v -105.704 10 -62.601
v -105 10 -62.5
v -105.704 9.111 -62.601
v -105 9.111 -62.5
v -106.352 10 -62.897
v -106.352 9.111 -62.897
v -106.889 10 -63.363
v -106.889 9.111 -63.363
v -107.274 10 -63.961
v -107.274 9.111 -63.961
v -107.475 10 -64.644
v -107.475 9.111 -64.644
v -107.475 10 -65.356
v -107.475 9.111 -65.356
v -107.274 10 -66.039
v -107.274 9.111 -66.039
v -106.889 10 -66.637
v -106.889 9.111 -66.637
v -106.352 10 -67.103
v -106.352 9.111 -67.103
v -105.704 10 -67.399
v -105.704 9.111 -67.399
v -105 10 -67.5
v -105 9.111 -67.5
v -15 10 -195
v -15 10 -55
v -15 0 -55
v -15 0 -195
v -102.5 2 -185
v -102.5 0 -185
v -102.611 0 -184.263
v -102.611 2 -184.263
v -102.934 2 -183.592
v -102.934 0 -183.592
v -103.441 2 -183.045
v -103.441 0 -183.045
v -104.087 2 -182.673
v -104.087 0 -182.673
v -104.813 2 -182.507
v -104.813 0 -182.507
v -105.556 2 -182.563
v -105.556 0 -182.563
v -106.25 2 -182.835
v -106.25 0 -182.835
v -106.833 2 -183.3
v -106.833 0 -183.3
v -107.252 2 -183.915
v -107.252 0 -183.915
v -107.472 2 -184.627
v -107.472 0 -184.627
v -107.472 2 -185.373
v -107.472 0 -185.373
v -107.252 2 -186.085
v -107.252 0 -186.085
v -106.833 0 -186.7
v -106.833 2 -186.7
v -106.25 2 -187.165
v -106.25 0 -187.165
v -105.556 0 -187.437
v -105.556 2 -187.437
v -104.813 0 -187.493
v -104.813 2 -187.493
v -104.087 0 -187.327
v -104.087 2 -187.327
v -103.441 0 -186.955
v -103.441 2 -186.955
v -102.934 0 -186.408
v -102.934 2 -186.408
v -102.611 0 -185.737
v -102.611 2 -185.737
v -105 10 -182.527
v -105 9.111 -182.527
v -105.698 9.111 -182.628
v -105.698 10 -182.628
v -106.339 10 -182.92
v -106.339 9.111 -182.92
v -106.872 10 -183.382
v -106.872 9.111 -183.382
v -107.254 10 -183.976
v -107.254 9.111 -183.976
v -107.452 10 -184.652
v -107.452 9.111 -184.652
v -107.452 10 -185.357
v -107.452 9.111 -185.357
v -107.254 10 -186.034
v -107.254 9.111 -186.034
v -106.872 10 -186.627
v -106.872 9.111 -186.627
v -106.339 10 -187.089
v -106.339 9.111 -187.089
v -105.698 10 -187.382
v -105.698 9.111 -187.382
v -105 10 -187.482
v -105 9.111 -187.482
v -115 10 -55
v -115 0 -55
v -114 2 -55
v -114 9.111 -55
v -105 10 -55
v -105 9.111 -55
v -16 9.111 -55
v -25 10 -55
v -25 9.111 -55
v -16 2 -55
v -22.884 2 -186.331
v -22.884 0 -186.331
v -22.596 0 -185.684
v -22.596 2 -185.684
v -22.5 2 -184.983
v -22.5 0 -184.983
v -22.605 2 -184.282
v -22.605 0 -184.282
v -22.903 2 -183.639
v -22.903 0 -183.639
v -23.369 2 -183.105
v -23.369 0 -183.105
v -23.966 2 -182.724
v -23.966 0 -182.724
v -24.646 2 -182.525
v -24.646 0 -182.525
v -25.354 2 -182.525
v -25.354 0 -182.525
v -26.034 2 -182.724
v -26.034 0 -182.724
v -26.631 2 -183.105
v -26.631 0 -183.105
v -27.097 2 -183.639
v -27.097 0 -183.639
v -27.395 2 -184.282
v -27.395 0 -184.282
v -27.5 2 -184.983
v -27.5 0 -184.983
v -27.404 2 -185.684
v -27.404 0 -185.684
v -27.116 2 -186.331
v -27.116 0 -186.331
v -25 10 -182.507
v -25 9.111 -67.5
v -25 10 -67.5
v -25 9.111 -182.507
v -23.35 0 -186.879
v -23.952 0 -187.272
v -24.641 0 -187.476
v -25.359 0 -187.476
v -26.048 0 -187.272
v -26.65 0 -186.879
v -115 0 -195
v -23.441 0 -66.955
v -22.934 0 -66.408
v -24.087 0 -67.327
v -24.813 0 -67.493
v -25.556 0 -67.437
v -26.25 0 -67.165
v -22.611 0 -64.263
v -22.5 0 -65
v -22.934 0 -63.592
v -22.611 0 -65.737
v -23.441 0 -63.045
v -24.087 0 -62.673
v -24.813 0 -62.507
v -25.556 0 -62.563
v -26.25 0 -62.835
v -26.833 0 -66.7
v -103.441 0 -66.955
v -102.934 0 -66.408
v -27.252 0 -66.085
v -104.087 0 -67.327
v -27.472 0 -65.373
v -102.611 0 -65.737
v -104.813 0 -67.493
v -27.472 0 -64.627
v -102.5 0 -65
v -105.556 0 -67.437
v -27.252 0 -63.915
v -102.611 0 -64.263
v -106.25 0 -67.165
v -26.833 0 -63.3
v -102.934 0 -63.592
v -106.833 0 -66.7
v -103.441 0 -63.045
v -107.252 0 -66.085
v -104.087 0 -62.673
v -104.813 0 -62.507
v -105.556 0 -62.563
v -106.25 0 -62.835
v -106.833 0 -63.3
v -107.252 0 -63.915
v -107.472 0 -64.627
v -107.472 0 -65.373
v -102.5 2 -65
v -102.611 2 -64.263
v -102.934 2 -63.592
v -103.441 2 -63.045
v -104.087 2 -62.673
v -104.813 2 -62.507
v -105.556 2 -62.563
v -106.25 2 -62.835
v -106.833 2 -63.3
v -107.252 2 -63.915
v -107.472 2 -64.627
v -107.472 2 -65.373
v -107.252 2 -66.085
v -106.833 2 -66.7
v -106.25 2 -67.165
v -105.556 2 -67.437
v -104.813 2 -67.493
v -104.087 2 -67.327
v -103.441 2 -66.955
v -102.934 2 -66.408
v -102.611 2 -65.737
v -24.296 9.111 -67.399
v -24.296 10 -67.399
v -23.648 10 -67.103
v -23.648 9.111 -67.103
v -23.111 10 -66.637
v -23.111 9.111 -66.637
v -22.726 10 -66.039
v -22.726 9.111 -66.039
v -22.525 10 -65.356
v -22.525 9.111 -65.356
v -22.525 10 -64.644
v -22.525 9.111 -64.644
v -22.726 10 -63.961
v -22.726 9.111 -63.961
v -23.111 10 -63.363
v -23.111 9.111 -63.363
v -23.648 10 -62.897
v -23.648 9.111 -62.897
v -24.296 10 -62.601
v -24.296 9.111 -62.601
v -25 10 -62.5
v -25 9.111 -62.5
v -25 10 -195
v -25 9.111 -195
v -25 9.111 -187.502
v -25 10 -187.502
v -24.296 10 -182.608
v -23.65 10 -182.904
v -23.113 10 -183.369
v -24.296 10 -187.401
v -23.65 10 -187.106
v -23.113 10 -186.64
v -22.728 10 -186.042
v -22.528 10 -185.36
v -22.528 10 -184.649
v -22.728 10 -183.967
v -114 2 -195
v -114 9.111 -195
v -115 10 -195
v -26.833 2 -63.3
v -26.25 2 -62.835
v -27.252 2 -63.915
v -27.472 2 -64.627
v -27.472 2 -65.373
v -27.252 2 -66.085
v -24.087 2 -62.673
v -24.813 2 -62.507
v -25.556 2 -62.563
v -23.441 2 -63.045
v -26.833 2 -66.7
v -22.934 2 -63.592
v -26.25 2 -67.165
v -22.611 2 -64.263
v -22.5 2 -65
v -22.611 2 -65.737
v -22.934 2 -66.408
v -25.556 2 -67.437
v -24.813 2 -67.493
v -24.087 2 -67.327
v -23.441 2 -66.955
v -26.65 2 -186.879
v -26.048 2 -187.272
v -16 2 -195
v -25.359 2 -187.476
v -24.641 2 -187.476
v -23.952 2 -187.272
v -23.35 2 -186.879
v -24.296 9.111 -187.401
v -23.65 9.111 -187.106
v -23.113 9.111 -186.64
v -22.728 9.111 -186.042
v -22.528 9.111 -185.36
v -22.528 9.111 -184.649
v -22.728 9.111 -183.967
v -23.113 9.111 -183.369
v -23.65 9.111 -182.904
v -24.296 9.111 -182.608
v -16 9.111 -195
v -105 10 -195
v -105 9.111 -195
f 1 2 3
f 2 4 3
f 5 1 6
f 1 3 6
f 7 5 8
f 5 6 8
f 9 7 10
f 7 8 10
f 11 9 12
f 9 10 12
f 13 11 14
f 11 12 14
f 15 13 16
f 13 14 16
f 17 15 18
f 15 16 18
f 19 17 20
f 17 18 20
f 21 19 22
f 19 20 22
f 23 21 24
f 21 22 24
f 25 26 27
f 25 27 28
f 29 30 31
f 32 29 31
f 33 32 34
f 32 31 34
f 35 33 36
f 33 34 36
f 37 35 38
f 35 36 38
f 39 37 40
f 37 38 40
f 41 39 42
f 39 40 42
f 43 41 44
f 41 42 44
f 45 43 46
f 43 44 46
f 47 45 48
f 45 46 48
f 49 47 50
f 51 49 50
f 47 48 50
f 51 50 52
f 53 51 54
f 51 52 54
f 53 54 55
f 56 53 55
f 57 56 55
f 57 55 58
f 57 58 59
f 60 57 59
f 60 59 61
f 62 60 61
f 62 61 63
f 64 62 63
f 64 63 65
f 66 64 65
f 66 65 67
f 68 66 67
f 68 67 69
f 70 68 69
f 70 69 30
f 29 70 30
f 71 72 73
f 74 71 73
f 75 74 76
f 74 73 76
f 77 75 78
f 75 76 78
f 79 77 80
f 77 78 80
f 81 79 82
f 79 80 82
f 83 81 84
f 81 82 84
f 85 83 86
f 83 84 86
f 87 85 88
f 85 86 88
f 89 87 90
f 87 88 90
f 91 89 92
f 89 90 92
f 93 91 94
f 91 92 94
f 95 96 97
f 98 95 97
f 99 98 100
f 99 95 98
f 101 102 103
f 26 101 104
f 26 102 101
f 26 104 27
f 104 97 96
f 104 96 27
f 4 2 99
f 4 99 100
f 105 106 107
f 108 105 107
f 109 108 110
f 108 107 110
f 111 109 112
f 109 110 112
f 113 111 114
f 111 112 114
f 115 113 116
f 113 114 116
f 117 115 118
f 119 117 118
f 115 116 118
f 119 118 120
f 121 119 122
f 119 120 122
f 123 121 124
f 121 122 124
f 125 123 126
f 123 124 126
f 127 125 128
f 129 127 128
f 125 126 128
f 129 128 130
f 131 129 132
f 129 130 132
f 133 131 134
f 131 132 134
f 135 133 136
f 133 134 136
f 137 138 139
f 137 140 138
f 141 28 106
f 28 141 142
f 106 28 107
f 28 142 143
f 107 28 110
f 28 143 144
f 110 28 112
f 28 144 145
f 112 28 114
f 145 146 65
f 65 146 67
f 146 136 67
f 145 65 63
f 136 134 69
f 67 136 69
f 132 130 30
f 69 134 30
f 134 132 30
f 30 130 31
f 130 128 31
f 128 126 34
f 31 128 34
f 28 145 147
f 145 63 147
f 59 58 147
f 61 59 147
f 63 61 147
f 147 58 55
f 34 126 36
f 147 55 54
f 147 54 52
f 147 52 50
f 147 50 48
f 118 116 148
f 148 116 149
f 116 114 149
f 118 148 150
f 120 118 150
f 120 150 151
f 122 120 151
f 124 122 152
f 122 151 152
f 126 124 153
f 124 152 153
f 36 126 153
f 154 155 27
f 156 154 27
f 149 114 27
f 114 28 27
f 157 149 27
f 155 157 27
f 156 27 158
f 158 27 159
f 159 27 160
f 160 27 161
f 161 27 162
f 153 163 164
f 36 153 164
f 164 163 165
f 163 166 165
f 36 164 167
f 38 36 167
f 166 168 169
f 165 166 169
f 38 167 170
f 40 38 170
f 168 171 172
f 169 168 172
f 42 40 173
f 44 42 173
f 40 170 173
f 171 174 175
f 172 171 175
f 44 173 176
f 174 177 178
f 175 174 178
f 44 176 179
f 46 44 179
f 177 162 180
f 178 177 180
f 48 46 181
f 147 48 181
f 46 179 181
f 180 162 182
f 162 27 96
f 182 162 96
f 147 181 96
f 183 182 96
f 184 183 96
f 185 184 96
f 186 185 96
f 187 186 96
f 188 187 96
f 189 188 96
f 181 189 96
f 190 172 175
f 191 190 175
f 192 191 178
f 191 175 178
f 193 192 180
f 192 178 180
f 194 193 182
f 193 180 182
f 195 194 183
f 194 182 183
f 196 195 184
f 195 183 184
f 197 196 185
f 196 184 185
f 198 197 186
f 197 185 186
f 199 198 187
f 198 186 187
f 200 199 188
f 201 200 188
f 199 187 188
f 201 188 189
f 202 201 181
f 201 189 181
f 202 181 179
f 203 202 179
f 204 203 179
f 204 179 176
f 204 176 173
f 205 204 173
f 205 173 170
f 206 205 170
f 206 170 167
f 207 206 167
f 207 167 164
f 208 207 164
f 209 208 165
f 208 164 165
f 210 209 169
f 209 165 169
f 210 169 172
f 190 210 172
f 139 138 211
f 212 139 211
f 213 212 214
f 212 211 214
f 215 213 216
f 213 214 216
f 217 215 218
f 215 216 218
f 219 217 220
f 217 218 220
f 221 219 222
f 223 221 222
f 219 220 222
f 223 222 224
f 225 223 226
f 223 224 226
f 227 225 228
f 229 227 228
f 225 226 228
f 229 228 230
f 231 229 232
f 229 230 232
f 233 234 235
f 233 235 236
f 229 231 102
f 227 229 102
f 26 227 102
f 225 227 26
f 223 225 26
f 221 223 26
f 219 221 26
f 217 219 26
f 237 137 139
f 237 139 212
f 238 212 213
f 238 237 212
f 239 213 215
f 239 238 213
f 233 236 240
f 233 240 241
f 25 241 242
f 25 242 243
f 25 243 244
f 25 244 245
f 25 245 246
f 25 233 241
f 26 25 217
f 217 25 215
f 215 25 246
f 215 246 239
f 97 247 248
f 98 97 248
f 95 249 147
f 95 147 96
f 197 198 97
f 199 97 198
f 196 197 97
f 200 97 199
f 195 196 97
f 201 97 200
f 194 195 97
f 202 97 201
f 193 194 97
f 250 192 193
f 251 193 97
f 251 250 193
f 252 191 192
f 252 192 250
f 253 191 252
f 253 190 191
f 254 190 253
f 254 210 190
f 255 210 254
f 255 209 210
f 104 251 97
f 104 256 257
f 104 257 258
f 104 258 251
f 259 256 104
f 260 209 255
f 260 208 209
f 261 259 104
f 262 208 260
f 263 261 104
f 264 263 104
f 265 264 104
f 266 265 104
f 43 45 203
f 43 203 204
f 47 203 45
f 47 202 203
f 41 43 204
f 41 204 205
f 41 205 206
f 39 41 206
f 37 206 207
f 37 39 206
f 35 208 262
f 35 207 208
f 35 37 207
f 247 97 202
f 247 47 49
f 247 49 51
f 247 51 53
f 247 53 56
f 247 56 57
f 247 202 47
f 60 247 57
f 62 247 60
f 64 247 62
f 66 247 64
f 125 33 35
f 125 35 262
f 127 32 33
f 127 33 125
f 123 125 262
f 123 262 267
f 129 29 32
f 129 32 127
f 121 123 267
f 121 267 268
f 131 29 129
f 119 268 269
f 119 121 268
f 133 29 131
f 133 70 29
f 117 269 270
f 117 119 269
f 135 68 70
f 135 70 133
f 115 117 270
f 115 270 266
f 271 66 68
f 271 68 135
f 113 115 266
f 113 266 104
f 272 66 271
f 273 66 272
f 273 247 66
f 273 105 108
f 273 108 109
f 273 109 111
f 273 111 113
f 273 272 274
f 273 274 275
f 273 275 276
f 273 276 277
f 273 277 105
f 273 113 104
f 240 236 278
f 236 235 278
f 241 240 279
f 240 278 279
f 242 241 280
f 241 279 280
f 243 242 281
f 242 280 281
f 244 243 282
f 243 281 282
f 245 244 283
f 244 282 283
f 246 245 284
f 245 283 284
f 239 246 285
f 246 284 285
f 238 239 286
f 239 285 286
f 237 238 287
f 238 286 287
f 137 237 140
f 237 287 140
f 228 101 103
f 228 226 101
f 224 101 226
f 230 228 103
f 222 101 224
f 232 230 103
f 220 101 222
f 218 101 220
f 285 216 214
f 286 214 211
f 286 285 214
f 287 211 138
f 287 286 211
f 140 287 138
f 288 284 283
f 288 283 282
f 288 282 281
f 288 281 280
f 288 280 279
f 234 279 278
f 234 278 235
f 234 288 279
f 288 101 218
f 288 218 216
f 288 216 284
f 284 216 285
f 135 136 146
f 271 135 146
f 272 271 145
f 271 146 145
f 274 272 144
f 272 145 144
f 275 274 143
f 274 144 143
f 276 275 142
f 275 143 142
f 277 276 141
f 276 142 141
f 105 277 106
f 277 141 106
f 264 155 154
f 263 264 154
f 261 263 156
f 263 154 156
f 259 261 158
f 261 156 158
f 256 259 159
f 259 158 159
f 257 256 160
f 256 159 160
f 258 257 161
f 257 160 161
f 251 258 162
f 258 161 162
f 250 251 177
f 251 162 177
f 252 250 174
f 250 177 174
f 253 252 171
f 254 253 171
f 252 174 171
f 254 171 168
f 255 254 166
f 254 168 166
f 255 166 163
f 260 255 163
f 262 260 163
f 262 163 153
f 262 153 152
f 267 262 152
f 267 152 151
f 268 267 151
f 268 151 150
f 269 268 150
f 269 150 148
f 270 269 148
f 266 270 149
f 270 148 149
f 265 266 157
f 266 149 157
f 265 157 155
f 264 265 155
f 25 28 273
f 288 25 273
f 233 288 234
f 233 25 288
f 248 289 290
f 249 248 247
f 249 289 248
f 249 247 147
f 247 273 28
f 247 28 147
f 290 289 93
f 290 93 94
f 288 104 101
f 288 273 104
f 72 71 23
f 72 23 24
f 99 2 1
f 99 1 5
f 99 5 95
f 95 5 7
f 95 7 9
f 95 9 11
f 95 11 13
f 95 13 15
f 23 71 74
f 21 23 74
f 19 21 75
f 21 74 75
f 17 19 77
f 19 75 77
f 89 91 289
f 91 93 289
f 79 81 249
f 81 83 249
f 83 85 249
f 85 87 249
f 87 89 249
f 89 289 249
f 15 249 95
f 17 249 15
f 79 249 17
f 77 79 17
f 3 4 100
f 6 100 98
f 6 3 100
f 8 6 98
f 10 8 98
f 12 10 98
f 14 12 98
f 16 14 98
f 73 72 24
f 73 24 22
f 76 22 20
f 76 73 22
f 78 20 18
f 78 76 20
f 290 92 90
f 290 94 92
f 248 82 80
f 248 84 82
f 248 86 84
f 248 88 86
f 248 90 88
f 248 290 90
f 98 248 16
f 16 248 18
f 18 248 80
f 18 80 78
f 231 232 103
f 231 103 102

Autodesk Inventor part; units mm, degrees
ref_plane "YZ Plane" through (0, 0, 0) normal (1, 0, 0) x (0, 1, 0)
ref_plane "XZ Plane" through (0, 0, 0) normal (0, 1, 0) x (-1, 0, 0)
ref_plane "XY Plane" through (0, 0, 0) normal (0, 0, 1) x (1, 0, 0)
sketch "Boceto1" plane through (0, 0, 0) normal (0, 1, 0) x (-1, 0, 0)
  line L0 (0, 0) -> (130, 0)
  line L1 (130, 0) -> (130, -230)
  line L2 (130, -230) -> (0, -230)
  line L3 (0, -230) -> (0, 0)
  dimension "d0" = 130
  dimension "d1" = 230
extrude "Extrusión1" add sketch "Boceto1" along normal blind 3
sketch "Boceto2" plane through (0, 3, 0) normal (0, 1, 0) x (1, 0, 0)
  line L0 (0, 230) -> (-130, 230) projected
  line L1 (0, 0) -> (-130, 0)
  line L2 (-130, 0) -> (-130, 230)
  line L3 (-130, 230) -> (0, 230)
  line L4 (0, 230) -> (0, 0)
  line L5 (-127, 227) -> (-127, 3)
  line L6 (-127, 3) -> (-3, 3)
  line L7 (-3, 3) -> (-3, 227)
  line L8 (-3, 227) -> (-127, 227)
  dimension "d4" = 3
extrude "Extrusión2" add sketch "Boceto2" along normal blind 60
sketch "Boceto3" plane through (-127, 3, -3) normal (1, 0, 0) x (0, 0, -1)
  line L0 (224, 0) -> (224, 60) projected
  line L1 (0, 60) -> (224, 60)
  line L2 (224, 60) -> (224, 59)
  line L3 (224, 59) -> (0, 59)
  line L4 (0, 59) -> (0, 60)
  point P0 (-3, -3)
  dimension "d7" = 1
extrude "Extrusión3" add sketch "Boceto3" along normal blind 10
sketch "Boceto4" plane through (-117, 3, -3) normal (1, 0, 0) x (0, 0, -1)
  line L0 (0, 59) -> (224, 59) projected
  line L1 (0, 60) -> (10, 60)
  line L2 (10, 60) -> (10, 59)
  line L3 (10, 59) -> (0, 59)
  line L4 (0, 59) -> (0, 60)
  line L5 (224, 60) -> (214, 60)
  line L6 (214, 60) -> (214, 59)
  line L7 (214, 59) -> (224, 59)
  line L8 (224, 59) -> (224, 60)
  point P0 (-3, -3)
  dimension "d10" = 10
  dimension "d11" = 10
extrude "Extrusión4" add sketch "Boceto4" along normal blind 115.25
sketch "Boceto5" plane through (-117, 63, -217) normal (0, 0, 1) x (1, 0, 0)
  line L0 (114, -1) -> (104, -1)
  line L1 (104, -1) -> (104, 0)
  line L2 (104, 0) -> (114, 0)
  line L3 (114, 0) -> (114, -1)
  line L4 (0, 0) -> (114, 0) projected
  line L5 (0, -1) -> (114, -1) projected
  point P0 (117, -63)
  dimension "d14" = 10
  dimension "d15" = 0
  dimension "d16" = 0
extrude "Extrusión5" add sketch "Boceto5" along normal blind 211.5
sketch "Boceto6" plane through (0, 63, 0) normal (0, 1, 0) x (1, 0, 0)
  circle A0 centre (-10, 220) radius 1.5
  circle A1 centre (-120, 220) radius 1.5
  circle A2 centre (-10, 10) radius 1.5
  circle A3 centre (-120, 10) radius 1.5
  line L0 (-130, 0) -> (0, 0) projected
  line L1 (0, 0) -> (0, 230) projected
  line L2 (-130, 230) -> (-130, 0) projected
  line L3 (0, 230) -> (-130, 230) projected
  dimension "d19" = 3
  dimension "d20" = 3
  dimension "d21" = 3
  dimension "d22" = 3
  dimension "d23" = 10
  dimension "d24" = 10
  dimension "d25" = 10
  dimension "d26" = 10
  dimension "d27" = 10
  dimension "d28" = 10
  dimension "d29" = 10
  dimension "d30" = 10
extrude "Extrusión6" cut sketch "Boceto6" against normal blind 211.5 contours A0 | A1 | A2 | A3
sketch "Boceto7" plane through (0, 0, 0) normal (0, -1, 0) x (1, 0, 0)
  circle A0 centre (-25, -205) radius 4
  circle A1 centre (-105, -205) radius 4
  circle A2 centre (-25, -25) radius 4
  circle A3 centre (-105, -25) radius 4
  line L0 (0, 0) -> (0, -230) projected
  line L1 (0, -230) -> (-130, -230) projected
  line L2 (-130, -230) -> (-130, 0) projected
  line L3 (-130, 0) -> (0, 0) projected
  dimension "d33" = 8
  dimension "d34" = 8
  dimension "d35" = 8
  dimension "d36" = 8
  dimension "d37" = 25
  dimension "d38" = 25
  dimension "d39" = 25
  dimension "d40" = 25
  dimension "d41" = 25
  dimension "d42" = 25
  dimension "d43" = 25
  dimension "d44" = 25
extrude "Extrusión7" cut sketch "Boceto7" against normal blind 10 contours A0 | A1 | A2 | A3
sketch "Boceto8" plane through (0, 0, 0) normal (0, -1, 0) x (1, 0, 0)
  line L0 (-30, -35) -> (-100, -35)
  line L1 (-100, -35) -> (-100, -45)
  line L2 (-100, -45) -> (-30, -45)
  line L3 (-30, -45) -> (-30, -35)
  line L4 (-130, 0) -> (0, 0) projected
  line L5 (0, 0) -> (0, -230) projected
  line L6 (-130, -230) -> (-130, 0) projected
  circle A0 centre (-35, -40) radius 2.5
  circle A1 centre (-95, -40) radius 2.5
  point P0 (-30, -40)
  dimension "d47" = 70
  dimension "d48" = 10
  dimension "d49" = 35
  dimension "d50" = 30
  dimension "d51" = 30
  dimension "d52" = 5
  dimension "d53" = 5
  dimension "d54" = 5
  dimension "d55" = 5
  dimension "d56" = 5
  dimension "d57" = 5
extrude "Extrusión8" cut sketch "Boceto8" against normal blind 10 contours A0 | A1
sketch "Boceto9" plane through (0, 0, 0) normal (0, -1, 0) x (1, 0, 0)
  line L0 (-20, -190) -> (-110, -190)
  line L1 (-110, -190) -> (-110, -60)
  line L2 (-110, -60) -> (-20, -60)
  line L3 (-20, -60) -> (-20, -190)
  line L4 (0, 0) -> (0, -230) projected
  line L5 (-130, -230) -> (-130, 0) projected
  line L6 (-130, 0) -> (0, 0) projected
  circle A0 centre (-25, -185) radius 2.5
  circle A1 centre (-25, -65) radius 2.5
  circle A2 centre (-105, -65) radius 2.5
  circle A3 centre (-105, -185) radius 2.5
  dimension "d60" = 90
  dimension "d61" = 130
  dimension "d62" = 20
  dimension "d63" = 20
  dimension "d64" = 60
  dimension "d65" = 5
  dimension "d66" = 5
  dimension "d67" = 5
  dimension "d68" = 5
  dimension "d69" = 5
  dimension "d70" = 5
  dimension "d71" = 5
  dimension "d72" = 5
  dimension "d73" = 5
  dimension "d74" = 5
  dimension "d75" = 5
  dimension "d76" = 5
extrude "Extrusión9" cut sketch "Boceto9" against normal blind 10 contours A0 | A1 | A2 | A3
sketch "Boceto11" plane through (0, 63, 0) normal (0, 1, 0) x (1, 0, 0)
  line L0 (-230.0178, 308.5075) -> (121.3875, 308.5075)
  line L1 (121.3875, 308.5075) -> (121.3875, -22.7652)
  line L2 (121.3875, -22.7652) -> (-230.0178, -22.7652)
  line L3 (-230.0178, -22.7652) -> (-230.0178, 308.5075)
  point P0 (0, 0)
extrude "Extrusión10" cut sketch "Boceto11" against normal blind 61
sketch "Boceto12" plane through (0, 2, 0) normal (0, 1, 0) x (1, 0, 0)
  circle A0 centre (-105, 185) radius 2.5 projected
  circle A1 centre (-25, 65) radius 2.5 projected
  line L0 (-105, 185) -> (-25, 185)
  line L1 (-25, 185) -> (-25, 65)
  line L2 (-25, 65) -> (-105, 65)
  line L3 (-105, 65) -> (-105, 185)
  line L4 (-158.8037, 262.2681) -> (33.433, 262.2681)
  line L5 (33.433, 262.2681) -> (33.433, -27.1386)
  line L6 (33.433, -27.1386) -> (-158.8037, -27.1386)
  line L7 (-158.8037, -27.1386) -> (-158.8037, 262.2681)
  line L8 (-15, 55) -> (-15, 195)
  line L9 (-15, 195) -> (-115, 195)
  line L10 (-115, 195) -> (-115, 55)
  line L11 (-115, 55) -> (-15, 55)
  circle A2 centre (-105, 185) radius 2.5
  circle A3 centre (-25, 185) radius 2.5 projected
  circle A4 centre (-25, 185) radius 2.5
  circle A5 centre (-105, 65) radius 2.5 projected
  circle A6 centre (-105, 65) radius 2.5
  circle A7 centre (-25, 65) radius 2.5
  point P0 (0, 0)
  dimension "d81" = 10
extrude "Extrusión11" cut sketch "Boceto12" against normal blind 61 contours L4 L5 L6 L7
sketch "Boceto13" plane through (-15, 2, -195) normal (0, 0, -1) x (-1, 0, 0)
  line L0 (100, 0) -> (100, -2) projected
  line L1 (100, -2) -> (99, -2)
  line L2 (99, -2) -> (99, 8)
  line L3 (99, 8) -> (100, 8)
  line L4 (100, 8) -> (100, -2)
  line L5 (0, -2) -> (1, -2)
  line L6 (1, -2) -> (1, 8)
  line L7 (1, 8) -> (0, 8)
  line L8 (0, 8) -> (0, -2)
  line L9 (0, 0) -> (0, -2) projected
  line L10 (100, 8) -> (0, 8)
  line L11 (0, 8) -> (0, 7.1109)
  line L12 (0, 7.1109) -> (100, 7.1109)
  line L13 (100, 7.1109) -> (100, 8)
  line L14 (90, 7.1109) -> (10, 7.1109)
  line L15 (10, 7.1109) -> (10, 8)
  line L16 (10, 8) -> (90, 8)
  line L17 (90, 8) -> (90, 7.1109)
  line L18 (100, 0) -> (0, 0)
  line L19 (0, 0) -> (0, 8)
  line L20 (0, 8) -> (100, 8)
  line L21 (100, 8) -> (100, 0)
  point P0 (-15, -2)
  point P1 (0, -1)
  point P2 (90, 7.5554)
  point P3 (10, 7.5554)
  point P4 (99, 0)
  point P5 (99, 7.1109)
  point P6 (10, 7.1109)
  point P7 (1, 8)
  point P8 (1, 0)
  point P9 (1, 7.1109)
  dimension "d84" = 1
  dimension "d85" = 1
  dimension "d86" = 0
  dimension "d87" = 10
  dimension "d88" = 10
  dimension "d89" = 100
  dimension "d90" = 10
  dimension "d91" = 10
extrude "Extrusión12" add sketch "Boceto13" against normal blind 140 contours L18 L2 L12 L4 | L12 L2 L3 L4 | L12 L17 L10 L2 | L18 L8 L12 L6 | L12 L8 L7 L6 | L6 L10 L15 L12
sketch "Boceto14" plane through (0, 0, 0) normal (0, -1, 0) x (1, 0, 0)
  circle A0 centre (-25, -65) radius 2.5 projected
  circle A1 centre (-25, -65) radius 2.5
  line L0 (-25, -195) -> (-25, -55) projected
  circle A2 centre (-25, -185.0047) radius 2.4975
  line L1 (-105, -195) -> (-105, -55) projected
  circle A3 centre (-105, -185.0047) radius 2.4775
  circle A4 centre (-105, -65) radius 2.5 projected
  circle A5 centre (-105, -65) radius 2.5
  point P0 (0, 0)
extrude "Extrusión13" cut sketch "Boceto14" against normal blind 140
